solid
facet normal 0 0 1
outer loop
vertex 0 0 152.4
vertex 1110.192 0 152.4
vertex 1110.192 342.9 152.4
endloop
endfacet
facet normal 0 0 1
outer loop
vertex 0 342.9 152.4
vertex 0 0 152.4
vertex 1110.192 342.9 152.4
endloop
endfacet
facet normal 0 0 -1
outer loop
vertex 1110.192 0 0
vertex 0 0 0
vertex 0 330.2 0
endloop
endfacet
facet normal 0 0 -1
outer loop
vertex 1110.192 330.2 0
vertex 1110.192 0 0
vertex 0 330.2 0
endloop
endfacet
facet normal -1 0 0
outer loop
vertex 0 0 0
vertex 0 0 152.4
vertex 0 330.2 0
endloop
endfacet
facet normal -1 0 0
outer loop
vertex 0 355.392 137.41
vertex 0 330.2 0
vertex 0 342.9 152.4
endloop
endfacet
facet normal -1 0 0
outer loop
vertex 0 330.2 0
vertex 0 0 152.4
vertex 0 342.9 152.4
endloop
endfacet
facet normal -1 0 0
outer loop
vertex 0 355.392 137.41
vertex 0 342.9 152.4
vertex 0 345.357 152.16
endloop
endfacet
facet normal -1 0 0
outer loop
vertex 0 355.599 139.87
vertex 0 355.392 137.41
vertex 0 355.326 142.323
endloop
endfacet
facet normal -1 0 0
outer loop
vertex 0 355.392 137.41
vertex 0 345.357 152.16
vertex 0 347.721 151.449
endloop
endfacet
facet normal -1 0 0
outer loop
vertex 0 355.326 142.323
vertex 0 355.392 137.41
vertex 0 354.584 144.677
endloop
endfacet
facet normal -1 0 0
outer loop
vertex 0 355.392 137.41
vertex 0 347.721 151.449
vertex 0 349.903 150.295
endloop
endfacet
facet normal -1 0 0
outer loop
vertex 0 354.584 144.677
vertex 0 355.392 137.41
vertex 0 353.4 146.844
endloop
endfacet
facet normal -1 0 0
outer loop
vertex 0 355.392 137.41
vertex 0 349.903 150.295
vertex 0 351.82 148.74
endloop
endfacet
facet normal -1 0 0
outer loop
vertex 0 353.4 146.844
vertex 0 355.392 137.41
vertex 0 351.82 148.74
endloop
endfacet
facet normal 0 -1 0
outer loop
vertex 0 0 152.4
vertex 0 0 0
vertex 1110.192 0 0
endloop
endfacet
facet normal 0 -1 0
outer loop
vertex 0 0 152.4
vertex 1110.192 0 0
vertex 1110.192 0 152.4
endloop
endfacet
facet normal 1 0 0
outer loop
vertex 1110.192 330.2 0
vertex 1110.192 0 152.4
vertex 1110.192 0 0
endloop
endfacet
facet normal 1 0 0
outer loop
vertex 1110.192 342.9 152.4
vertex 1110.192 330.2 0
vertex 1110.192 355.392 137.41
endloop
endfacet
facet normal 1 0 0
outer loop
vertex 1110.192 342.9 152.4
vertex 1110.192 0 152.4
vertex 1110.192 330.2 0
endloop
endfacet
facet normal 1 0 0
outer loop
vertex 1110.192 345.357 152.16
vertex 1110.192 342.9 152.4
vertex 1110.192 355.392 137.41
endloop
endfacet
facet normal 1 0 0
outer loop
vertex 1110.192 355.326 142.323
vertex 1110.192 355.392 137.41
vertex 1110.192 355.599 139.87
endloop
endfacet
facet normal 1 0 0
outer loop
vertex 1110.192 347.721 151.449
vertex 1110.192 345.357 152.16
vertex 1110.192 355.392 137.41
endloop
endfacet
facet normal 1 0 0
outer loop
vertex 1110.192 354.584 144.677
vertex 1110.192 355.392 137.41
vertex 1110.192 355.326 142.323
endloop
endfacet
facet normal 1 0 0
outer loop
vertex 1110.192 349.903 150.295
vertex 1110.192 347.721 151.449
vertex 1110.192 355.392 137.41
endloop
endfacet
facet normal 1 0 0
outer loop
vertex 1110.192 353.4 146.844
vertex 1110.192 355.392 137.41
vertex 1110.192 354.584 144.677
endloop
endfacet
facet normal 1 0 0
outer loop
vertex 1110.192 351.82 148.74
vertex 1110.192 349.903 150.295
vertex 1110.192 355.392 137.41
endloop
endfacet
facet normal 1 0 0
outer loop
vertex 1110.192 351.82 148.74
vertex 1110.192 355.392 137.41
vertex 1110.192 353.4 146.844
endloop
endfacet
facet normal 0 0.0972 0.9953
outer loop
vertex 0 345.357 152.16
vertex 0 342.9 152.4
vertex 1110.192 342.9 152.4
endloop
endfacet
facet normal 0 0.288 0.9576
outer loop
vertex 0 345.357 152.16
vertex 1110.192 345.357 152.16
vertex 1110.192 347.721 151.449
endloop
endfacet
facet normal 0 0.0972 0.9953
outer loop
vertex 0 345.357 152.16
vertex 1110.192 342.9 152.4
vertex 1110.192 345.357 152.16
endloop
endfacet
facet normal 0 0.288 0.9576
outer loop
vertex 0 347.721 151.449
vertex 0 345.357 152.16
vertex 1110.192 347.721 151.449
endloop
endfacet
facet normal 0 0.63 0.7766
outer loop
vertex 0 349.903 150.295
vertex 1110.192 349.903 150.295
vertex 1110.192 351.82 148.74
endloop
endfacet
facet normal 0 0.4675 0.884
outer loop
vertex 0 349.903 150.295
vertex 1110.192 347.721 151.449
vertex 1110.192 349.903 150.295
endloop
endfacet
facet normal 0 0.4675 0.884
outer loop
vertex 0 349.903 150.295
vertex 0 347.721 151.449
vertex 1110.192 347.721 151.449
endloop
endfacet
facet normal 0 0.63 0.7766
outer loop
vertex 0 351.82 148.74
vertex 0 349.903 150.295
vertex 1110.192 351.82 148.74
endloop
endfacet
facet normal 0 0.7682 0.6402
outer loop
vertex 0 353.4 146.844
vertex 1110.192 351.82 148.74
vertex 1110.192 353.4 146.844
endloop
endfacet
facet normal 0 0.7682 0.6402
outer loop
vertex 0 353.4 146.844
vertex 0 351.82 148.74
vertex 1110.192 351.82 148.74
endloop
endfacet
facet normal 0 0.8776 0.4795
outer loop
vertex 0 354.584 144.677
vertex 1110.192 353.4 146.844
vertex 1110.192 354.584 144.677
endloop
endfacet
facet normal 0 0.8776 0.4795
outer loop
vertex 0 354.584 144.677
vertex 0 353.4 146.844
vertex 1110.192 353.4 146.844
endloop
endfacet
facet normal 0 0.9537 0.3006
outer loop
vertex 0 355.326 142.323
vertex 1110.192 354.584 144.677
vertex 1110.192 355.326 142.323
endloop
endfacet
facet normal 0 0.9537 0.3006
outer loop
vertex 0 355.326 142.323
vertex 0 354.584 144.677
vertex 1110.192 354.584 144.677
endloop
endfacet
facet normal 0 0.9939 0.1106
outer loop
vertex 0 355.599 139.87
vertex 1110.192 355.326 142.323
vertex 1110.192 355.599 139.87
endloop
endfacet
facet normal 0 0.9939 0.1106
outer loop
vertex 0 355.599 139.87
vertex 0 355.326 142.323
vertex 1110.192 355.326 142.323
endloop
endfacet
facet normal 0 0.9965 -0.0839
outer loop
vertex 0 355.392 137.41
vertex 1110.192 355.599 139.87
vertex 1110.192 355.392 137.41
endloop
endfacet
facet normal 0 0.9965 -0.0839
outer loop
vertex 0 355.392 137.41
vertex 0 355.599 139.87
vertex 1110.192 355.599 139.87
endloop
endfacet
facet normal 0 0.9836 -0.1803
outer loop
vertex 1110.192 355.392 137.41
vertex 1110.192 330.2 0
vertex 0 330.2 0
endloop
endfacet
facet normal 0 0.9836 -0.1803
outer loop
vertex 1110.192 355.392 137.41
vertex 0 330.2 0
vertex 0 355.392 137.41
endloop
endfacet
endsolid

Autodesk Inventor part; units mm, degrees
ref_plane "YZ Plane" through (0, 0, 0) normal (1, 0, 0) x (0, 1, 0)
ref_plane "XZ Plane" through (0, 0, 0) normal (0, 1, 0) x (-1, 0, 0)
ref_plane "XY Plane" through (0, 0, 0) normal (0, 0, 1) x (1, 0, 0)
sketch "Sketch1" plane through (0, 0, 0) normal (1, 0, 0) x (0, 1, 0)
  line L0 (0, 0) -> (0, 152.4)
  line L1 (0, 0) -> (330.2, 0)
  line L2 (0, 152.4) -> (342.9, 152.4)
  line L3 (342.9, 152.4) -> (342.9, 139.7) construction
  arc A0 (355.3918, 137.4098) -> (342.9, 152.4) centre (342.9, 139.7) ccw
  line L4 (330.2, 0) -> (355.3918, 137.4098)
  dimension "d0" = 152.4
  dimension "d1" = 330.2
  dimension "d2" = 342.9
  dimension "d3" = 12.7
extrude "Extrusion1" add sketch "Sketch1" along normal blind 1110.1916
properties part number "C" material "Granite, Cut, Polished"
